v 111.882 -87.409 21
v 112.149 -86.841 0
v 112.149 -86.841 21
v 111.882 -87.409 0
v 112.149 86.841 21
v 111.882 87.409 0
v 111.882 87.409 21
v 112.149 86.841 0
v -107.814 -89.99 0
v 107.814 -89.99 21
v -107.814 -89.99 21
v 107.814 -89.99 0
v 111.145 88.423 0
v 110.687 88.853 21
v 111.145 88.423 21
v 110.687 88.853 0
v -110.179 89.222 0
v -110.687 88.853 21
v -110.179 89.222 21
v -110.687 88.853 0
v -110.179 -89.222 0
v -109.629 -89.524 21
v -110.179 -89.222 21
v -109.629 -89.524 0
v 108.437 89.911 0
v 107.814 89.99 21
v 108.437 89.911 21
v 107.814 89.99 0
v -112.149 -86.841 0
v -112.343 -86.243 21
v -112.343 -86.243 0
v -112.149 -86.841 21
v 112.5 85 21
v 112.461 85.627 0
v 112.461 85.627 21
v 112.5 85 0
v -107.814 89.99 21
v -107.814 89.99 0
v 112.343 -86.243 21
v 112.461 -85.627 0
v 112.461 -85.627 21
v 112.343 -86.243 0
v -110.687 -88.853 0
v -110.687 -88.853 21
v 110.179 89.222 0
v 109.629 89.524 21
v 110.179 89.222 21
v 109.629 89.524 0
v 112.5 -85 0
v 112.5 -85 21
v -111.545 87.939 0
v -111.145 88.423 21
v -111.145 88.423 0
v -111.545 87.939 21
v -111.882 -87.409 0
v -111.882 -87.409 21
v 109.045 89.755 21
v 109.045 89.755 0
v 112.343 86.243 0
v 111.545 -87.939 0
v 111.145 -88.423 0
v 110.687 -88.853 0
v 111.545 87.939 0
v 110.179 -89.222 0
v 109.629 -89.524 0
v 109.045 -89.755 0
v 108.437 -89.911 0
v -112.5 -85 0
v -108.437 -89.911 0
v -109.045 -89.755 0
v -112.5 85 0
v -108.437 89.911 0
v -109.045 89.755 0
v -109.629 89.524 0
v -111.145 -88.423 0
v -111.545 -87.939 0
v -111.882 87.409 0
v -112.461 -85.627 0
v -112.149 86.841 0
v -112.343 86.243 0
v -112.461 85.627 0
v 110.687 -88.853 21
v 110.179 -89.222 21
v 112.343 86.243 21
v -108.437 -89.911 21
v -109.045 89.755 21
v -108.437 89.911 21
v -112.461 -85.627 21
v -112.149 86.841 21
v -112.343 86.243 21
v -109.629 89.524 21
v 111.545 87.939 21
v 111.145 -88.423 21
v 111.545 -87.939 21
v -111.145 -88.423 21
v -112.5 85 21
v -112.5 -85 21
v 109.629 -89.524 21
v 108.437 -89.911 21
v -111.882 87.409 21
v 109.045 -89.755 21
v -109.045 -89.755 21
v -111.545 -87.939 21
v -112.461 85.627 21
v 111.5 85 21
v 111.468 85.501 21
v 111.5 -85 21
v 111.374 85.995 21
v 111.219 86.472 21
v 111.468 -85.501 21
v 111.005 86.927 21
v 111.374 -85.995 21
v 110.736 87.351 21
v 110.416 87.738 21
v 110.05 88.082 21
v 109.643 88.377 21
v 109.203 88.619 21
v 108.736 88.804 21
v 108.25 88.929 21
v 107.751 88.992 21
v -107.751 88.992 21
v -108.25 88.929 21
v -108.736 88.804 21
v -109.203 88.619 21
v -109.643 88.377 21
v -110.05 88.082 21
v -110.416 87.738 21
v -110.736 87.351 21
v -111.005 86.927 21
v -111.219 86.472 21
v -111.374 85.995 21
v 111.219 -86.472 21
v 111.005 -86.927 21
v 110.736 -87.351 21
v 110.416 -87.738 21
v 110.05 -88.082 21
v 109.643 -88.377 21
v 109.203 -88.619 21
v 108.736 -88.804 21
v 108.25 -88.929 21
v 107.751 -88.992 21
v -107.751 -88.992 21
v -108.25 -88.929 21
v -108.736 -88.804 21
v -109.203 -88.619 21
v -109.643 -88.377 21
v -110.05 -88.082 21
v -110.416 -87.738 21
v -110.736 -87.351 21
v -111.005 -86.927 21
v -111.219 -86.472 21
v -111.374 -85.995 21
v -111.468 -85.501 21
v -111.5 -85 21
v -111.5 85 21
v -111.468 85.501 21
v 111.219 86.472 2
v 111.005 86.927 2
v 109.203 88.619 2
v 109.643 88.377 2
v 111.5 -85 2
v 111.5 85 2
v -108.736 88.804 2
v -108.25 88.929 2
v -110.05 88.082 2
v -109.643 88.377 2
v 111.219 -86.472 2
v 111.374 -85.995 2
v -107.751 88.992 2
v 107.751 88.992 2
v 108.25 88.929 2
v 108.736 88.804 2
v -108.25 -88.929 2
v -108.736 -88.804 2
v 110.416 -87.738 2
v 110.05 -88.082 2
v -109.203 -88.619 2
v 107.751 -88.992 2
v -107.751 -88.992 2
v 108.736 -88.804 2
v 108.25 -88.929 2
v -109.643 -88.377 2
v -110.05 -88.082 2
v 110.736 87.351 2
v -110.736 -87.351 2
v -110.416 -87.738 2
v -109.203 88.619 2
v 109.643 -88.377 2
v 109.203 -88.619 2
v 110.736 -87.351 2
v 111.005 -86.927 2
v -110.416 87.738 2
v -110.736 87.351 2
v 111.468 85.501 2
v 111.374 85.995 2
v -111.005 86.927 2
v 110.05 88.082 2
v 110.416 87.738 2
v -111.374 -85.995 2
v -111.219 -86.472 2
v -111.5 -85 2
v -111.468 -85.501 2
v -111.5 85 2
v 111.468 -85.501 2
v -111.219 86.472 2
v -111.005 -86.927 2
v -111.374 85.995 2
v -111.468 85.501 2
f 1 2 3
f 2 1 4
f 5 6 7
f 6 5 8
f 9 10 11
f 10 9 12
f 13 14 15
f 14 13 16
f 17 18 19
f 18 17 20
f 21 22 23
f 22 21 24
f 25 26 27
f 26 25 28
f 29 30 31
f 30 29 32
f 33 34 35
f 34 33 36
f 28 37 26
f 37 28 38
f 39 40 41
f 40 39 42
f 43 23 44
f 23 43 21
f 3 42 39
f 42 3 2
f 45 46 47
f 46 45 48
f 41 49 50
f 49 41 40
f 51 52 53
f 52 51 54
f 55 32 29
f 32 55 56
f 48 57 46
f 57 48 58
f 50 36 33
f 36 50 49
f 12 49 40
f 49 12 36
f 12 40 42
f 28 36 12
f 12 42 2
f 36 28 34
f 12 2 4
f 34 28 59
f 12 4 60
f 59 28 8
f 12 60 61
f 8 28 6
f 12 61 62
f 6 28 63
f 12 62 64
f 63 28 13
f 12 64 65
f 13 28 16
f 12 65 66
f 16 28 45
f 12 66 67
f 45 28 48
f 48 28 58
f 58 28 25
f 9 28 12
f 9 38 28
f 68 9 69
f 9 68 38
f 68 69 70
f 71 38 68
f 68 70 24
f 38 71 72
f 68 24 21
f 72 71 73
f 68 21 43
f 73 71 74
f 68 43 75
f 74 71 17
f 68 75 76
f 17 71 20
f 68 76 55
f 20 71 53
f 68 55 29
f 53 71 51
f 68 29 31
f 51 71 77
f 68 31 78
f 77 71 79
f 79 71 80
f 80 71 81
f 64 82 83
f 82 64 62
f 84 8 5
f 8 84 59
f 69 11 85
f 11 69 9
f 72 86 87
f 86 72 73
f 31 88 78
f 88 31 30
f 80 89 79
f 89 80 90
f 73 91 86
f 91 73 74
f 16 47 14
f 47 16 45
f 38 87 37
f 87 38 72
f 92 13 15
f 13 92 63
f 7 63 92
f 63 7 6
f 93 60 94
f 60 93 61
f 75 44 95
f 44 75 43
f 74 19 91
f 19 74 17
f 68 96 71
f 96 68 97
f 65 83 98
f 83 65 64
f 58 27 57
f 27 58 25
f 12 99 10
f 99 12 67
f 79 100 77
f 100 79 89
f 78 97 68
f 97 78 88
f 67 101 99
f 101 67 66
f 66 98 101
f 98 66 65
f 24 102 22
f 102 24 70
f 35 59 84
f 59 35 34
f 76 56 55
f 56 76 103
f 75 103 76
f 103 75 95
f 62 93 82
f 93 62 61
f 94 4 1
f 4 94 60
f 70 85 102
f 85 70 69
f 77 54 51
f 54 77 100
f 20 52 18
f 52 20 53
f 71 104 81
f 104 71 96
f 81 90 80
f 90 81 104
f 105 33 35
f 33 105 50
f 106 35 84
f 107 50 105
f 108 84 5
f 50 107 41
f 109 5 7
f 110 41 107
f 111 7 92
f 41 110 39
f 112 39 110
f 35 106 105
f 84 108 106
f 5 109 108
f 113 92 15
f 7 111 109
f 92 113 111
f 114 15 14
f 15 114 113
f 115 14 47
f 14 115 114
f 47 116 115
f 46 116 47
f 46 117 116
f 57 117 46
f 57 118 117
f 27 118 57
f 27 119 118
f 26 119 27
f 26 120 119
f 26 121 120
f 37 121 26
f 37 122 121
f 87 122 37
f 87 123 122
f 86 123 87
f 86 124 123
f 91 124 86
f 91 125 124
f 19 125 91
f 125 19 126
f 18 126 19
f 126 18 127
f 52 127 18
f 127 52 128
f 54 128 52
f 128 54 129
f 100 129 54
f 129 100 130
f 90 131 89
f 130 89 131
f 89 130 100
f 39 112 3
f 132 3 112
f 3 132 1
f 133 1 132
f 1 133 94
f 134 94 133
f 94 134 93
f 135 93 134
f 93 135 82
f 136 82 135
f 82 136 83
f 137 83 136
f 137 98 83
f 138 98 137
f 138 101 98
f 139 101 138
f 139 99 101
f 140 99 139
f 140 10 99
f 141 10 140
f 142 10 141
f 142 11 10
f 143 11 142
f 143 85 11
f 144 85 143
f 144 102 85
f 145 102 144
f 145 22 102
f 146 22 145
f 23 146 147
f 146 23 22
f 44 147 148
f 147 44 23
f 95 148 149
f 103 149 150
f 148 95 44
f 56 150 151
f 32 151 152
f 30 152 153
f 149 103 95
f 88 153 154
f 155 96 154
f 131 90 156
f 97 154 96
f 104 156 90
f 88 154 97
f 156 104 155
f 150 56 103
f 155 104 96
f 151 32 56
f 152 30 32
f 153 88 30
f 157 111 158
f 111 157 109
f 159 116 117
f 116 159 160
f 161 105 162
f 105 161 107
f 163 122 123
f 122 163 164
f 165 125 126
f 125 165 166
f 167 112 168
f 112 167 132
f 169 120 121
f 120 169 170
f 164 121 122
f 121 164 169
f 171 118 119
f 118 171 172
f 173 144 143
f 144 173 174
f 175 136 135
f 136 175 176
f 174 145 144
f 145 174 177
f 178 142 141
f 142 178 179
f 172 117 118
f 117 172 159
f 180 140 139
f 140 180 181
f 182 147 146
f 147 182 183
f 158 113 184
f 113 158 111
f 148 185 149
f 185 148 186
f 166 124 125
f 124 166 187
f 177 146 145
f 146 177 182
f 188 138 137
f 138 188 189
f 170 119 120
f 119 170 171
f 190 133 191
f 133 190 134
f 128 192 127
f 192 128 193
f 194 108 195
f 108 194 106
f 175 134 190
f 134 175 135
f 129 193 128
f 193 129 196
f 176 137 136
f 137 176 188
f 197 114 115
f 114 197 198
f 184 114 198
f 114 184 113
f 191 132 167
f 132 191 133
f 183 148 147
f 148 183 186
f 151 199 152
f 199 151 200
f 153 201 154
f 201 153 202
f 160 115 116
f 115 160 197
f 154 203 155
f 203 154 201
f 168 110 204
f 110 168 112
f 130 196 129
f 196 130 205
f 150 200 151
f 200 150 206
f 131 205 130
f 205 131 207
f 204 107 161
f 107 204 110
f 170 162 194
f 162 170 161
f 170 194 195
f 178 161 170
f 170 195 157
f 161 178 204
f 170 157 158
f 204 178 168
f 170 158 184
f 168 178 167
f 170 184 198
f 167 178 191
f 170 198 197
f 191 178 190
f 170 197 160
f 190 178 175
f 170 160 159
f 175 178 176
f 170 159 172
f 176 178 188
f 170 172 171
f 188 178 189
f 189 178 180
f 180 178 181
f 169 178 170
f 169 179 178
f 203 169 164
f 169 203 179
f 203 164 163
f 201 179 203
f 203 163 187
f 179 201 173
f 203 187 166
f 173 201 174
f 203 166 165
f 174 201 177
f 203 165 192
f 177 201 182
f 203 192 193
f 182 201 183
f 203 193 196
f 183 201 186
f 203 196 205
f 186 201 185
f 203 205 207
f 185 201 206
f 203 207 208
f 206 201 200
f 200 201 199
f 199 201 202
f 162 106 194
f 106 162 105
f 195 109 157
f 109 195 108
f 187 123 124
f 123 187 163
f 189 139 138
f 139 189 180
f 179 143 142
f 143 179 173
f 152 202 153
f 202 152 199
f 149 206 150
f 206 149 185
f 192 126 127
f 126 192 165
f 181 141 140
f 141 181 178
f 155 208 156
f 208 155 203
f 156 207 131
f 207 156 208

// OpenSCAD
$fn = 50;


difference() {
	union() {
		hull() {
			translate(v = [-107.5000000000, 85.0000000000, 0]) {
				cylinder(h = 21, r = 5);
			}
			translate(v = [107.5000000000, 85.0000000000, 0]) {
				cylinder(h = 21, r = 5);
			}
			translate(v = [-107.5000000000, -85.0000000000, 0]) {
				cylinder(h = 21, r = 5);
			}
			translate(v = [107.5000000000, -85.0000000000, 0]) {
				cylinder(h = 21, r = 5);
			}
		}
	}
	union() {
		translate(v = [0, 0, 2]) {
			hull() {
				translate(v = [-107.5000000000, 85.0000000000, 0]) {
					cylinder(h = 19, r = 4);
				}
				translate(v = [107.5000000000, 85.0000000000, 0]) {
					cylinder(h = 19, r = 4);
				}
				translate(v = [-107.5000000000, -85.0000000000, 0]) {
					cylinder(h = 19, r = 4);
				}
				translate(v = [107.5000000000, -85.0000000000, 0]) {
					cylinder(h = 19, r = 4);
				}
			}
		}
	}
}
